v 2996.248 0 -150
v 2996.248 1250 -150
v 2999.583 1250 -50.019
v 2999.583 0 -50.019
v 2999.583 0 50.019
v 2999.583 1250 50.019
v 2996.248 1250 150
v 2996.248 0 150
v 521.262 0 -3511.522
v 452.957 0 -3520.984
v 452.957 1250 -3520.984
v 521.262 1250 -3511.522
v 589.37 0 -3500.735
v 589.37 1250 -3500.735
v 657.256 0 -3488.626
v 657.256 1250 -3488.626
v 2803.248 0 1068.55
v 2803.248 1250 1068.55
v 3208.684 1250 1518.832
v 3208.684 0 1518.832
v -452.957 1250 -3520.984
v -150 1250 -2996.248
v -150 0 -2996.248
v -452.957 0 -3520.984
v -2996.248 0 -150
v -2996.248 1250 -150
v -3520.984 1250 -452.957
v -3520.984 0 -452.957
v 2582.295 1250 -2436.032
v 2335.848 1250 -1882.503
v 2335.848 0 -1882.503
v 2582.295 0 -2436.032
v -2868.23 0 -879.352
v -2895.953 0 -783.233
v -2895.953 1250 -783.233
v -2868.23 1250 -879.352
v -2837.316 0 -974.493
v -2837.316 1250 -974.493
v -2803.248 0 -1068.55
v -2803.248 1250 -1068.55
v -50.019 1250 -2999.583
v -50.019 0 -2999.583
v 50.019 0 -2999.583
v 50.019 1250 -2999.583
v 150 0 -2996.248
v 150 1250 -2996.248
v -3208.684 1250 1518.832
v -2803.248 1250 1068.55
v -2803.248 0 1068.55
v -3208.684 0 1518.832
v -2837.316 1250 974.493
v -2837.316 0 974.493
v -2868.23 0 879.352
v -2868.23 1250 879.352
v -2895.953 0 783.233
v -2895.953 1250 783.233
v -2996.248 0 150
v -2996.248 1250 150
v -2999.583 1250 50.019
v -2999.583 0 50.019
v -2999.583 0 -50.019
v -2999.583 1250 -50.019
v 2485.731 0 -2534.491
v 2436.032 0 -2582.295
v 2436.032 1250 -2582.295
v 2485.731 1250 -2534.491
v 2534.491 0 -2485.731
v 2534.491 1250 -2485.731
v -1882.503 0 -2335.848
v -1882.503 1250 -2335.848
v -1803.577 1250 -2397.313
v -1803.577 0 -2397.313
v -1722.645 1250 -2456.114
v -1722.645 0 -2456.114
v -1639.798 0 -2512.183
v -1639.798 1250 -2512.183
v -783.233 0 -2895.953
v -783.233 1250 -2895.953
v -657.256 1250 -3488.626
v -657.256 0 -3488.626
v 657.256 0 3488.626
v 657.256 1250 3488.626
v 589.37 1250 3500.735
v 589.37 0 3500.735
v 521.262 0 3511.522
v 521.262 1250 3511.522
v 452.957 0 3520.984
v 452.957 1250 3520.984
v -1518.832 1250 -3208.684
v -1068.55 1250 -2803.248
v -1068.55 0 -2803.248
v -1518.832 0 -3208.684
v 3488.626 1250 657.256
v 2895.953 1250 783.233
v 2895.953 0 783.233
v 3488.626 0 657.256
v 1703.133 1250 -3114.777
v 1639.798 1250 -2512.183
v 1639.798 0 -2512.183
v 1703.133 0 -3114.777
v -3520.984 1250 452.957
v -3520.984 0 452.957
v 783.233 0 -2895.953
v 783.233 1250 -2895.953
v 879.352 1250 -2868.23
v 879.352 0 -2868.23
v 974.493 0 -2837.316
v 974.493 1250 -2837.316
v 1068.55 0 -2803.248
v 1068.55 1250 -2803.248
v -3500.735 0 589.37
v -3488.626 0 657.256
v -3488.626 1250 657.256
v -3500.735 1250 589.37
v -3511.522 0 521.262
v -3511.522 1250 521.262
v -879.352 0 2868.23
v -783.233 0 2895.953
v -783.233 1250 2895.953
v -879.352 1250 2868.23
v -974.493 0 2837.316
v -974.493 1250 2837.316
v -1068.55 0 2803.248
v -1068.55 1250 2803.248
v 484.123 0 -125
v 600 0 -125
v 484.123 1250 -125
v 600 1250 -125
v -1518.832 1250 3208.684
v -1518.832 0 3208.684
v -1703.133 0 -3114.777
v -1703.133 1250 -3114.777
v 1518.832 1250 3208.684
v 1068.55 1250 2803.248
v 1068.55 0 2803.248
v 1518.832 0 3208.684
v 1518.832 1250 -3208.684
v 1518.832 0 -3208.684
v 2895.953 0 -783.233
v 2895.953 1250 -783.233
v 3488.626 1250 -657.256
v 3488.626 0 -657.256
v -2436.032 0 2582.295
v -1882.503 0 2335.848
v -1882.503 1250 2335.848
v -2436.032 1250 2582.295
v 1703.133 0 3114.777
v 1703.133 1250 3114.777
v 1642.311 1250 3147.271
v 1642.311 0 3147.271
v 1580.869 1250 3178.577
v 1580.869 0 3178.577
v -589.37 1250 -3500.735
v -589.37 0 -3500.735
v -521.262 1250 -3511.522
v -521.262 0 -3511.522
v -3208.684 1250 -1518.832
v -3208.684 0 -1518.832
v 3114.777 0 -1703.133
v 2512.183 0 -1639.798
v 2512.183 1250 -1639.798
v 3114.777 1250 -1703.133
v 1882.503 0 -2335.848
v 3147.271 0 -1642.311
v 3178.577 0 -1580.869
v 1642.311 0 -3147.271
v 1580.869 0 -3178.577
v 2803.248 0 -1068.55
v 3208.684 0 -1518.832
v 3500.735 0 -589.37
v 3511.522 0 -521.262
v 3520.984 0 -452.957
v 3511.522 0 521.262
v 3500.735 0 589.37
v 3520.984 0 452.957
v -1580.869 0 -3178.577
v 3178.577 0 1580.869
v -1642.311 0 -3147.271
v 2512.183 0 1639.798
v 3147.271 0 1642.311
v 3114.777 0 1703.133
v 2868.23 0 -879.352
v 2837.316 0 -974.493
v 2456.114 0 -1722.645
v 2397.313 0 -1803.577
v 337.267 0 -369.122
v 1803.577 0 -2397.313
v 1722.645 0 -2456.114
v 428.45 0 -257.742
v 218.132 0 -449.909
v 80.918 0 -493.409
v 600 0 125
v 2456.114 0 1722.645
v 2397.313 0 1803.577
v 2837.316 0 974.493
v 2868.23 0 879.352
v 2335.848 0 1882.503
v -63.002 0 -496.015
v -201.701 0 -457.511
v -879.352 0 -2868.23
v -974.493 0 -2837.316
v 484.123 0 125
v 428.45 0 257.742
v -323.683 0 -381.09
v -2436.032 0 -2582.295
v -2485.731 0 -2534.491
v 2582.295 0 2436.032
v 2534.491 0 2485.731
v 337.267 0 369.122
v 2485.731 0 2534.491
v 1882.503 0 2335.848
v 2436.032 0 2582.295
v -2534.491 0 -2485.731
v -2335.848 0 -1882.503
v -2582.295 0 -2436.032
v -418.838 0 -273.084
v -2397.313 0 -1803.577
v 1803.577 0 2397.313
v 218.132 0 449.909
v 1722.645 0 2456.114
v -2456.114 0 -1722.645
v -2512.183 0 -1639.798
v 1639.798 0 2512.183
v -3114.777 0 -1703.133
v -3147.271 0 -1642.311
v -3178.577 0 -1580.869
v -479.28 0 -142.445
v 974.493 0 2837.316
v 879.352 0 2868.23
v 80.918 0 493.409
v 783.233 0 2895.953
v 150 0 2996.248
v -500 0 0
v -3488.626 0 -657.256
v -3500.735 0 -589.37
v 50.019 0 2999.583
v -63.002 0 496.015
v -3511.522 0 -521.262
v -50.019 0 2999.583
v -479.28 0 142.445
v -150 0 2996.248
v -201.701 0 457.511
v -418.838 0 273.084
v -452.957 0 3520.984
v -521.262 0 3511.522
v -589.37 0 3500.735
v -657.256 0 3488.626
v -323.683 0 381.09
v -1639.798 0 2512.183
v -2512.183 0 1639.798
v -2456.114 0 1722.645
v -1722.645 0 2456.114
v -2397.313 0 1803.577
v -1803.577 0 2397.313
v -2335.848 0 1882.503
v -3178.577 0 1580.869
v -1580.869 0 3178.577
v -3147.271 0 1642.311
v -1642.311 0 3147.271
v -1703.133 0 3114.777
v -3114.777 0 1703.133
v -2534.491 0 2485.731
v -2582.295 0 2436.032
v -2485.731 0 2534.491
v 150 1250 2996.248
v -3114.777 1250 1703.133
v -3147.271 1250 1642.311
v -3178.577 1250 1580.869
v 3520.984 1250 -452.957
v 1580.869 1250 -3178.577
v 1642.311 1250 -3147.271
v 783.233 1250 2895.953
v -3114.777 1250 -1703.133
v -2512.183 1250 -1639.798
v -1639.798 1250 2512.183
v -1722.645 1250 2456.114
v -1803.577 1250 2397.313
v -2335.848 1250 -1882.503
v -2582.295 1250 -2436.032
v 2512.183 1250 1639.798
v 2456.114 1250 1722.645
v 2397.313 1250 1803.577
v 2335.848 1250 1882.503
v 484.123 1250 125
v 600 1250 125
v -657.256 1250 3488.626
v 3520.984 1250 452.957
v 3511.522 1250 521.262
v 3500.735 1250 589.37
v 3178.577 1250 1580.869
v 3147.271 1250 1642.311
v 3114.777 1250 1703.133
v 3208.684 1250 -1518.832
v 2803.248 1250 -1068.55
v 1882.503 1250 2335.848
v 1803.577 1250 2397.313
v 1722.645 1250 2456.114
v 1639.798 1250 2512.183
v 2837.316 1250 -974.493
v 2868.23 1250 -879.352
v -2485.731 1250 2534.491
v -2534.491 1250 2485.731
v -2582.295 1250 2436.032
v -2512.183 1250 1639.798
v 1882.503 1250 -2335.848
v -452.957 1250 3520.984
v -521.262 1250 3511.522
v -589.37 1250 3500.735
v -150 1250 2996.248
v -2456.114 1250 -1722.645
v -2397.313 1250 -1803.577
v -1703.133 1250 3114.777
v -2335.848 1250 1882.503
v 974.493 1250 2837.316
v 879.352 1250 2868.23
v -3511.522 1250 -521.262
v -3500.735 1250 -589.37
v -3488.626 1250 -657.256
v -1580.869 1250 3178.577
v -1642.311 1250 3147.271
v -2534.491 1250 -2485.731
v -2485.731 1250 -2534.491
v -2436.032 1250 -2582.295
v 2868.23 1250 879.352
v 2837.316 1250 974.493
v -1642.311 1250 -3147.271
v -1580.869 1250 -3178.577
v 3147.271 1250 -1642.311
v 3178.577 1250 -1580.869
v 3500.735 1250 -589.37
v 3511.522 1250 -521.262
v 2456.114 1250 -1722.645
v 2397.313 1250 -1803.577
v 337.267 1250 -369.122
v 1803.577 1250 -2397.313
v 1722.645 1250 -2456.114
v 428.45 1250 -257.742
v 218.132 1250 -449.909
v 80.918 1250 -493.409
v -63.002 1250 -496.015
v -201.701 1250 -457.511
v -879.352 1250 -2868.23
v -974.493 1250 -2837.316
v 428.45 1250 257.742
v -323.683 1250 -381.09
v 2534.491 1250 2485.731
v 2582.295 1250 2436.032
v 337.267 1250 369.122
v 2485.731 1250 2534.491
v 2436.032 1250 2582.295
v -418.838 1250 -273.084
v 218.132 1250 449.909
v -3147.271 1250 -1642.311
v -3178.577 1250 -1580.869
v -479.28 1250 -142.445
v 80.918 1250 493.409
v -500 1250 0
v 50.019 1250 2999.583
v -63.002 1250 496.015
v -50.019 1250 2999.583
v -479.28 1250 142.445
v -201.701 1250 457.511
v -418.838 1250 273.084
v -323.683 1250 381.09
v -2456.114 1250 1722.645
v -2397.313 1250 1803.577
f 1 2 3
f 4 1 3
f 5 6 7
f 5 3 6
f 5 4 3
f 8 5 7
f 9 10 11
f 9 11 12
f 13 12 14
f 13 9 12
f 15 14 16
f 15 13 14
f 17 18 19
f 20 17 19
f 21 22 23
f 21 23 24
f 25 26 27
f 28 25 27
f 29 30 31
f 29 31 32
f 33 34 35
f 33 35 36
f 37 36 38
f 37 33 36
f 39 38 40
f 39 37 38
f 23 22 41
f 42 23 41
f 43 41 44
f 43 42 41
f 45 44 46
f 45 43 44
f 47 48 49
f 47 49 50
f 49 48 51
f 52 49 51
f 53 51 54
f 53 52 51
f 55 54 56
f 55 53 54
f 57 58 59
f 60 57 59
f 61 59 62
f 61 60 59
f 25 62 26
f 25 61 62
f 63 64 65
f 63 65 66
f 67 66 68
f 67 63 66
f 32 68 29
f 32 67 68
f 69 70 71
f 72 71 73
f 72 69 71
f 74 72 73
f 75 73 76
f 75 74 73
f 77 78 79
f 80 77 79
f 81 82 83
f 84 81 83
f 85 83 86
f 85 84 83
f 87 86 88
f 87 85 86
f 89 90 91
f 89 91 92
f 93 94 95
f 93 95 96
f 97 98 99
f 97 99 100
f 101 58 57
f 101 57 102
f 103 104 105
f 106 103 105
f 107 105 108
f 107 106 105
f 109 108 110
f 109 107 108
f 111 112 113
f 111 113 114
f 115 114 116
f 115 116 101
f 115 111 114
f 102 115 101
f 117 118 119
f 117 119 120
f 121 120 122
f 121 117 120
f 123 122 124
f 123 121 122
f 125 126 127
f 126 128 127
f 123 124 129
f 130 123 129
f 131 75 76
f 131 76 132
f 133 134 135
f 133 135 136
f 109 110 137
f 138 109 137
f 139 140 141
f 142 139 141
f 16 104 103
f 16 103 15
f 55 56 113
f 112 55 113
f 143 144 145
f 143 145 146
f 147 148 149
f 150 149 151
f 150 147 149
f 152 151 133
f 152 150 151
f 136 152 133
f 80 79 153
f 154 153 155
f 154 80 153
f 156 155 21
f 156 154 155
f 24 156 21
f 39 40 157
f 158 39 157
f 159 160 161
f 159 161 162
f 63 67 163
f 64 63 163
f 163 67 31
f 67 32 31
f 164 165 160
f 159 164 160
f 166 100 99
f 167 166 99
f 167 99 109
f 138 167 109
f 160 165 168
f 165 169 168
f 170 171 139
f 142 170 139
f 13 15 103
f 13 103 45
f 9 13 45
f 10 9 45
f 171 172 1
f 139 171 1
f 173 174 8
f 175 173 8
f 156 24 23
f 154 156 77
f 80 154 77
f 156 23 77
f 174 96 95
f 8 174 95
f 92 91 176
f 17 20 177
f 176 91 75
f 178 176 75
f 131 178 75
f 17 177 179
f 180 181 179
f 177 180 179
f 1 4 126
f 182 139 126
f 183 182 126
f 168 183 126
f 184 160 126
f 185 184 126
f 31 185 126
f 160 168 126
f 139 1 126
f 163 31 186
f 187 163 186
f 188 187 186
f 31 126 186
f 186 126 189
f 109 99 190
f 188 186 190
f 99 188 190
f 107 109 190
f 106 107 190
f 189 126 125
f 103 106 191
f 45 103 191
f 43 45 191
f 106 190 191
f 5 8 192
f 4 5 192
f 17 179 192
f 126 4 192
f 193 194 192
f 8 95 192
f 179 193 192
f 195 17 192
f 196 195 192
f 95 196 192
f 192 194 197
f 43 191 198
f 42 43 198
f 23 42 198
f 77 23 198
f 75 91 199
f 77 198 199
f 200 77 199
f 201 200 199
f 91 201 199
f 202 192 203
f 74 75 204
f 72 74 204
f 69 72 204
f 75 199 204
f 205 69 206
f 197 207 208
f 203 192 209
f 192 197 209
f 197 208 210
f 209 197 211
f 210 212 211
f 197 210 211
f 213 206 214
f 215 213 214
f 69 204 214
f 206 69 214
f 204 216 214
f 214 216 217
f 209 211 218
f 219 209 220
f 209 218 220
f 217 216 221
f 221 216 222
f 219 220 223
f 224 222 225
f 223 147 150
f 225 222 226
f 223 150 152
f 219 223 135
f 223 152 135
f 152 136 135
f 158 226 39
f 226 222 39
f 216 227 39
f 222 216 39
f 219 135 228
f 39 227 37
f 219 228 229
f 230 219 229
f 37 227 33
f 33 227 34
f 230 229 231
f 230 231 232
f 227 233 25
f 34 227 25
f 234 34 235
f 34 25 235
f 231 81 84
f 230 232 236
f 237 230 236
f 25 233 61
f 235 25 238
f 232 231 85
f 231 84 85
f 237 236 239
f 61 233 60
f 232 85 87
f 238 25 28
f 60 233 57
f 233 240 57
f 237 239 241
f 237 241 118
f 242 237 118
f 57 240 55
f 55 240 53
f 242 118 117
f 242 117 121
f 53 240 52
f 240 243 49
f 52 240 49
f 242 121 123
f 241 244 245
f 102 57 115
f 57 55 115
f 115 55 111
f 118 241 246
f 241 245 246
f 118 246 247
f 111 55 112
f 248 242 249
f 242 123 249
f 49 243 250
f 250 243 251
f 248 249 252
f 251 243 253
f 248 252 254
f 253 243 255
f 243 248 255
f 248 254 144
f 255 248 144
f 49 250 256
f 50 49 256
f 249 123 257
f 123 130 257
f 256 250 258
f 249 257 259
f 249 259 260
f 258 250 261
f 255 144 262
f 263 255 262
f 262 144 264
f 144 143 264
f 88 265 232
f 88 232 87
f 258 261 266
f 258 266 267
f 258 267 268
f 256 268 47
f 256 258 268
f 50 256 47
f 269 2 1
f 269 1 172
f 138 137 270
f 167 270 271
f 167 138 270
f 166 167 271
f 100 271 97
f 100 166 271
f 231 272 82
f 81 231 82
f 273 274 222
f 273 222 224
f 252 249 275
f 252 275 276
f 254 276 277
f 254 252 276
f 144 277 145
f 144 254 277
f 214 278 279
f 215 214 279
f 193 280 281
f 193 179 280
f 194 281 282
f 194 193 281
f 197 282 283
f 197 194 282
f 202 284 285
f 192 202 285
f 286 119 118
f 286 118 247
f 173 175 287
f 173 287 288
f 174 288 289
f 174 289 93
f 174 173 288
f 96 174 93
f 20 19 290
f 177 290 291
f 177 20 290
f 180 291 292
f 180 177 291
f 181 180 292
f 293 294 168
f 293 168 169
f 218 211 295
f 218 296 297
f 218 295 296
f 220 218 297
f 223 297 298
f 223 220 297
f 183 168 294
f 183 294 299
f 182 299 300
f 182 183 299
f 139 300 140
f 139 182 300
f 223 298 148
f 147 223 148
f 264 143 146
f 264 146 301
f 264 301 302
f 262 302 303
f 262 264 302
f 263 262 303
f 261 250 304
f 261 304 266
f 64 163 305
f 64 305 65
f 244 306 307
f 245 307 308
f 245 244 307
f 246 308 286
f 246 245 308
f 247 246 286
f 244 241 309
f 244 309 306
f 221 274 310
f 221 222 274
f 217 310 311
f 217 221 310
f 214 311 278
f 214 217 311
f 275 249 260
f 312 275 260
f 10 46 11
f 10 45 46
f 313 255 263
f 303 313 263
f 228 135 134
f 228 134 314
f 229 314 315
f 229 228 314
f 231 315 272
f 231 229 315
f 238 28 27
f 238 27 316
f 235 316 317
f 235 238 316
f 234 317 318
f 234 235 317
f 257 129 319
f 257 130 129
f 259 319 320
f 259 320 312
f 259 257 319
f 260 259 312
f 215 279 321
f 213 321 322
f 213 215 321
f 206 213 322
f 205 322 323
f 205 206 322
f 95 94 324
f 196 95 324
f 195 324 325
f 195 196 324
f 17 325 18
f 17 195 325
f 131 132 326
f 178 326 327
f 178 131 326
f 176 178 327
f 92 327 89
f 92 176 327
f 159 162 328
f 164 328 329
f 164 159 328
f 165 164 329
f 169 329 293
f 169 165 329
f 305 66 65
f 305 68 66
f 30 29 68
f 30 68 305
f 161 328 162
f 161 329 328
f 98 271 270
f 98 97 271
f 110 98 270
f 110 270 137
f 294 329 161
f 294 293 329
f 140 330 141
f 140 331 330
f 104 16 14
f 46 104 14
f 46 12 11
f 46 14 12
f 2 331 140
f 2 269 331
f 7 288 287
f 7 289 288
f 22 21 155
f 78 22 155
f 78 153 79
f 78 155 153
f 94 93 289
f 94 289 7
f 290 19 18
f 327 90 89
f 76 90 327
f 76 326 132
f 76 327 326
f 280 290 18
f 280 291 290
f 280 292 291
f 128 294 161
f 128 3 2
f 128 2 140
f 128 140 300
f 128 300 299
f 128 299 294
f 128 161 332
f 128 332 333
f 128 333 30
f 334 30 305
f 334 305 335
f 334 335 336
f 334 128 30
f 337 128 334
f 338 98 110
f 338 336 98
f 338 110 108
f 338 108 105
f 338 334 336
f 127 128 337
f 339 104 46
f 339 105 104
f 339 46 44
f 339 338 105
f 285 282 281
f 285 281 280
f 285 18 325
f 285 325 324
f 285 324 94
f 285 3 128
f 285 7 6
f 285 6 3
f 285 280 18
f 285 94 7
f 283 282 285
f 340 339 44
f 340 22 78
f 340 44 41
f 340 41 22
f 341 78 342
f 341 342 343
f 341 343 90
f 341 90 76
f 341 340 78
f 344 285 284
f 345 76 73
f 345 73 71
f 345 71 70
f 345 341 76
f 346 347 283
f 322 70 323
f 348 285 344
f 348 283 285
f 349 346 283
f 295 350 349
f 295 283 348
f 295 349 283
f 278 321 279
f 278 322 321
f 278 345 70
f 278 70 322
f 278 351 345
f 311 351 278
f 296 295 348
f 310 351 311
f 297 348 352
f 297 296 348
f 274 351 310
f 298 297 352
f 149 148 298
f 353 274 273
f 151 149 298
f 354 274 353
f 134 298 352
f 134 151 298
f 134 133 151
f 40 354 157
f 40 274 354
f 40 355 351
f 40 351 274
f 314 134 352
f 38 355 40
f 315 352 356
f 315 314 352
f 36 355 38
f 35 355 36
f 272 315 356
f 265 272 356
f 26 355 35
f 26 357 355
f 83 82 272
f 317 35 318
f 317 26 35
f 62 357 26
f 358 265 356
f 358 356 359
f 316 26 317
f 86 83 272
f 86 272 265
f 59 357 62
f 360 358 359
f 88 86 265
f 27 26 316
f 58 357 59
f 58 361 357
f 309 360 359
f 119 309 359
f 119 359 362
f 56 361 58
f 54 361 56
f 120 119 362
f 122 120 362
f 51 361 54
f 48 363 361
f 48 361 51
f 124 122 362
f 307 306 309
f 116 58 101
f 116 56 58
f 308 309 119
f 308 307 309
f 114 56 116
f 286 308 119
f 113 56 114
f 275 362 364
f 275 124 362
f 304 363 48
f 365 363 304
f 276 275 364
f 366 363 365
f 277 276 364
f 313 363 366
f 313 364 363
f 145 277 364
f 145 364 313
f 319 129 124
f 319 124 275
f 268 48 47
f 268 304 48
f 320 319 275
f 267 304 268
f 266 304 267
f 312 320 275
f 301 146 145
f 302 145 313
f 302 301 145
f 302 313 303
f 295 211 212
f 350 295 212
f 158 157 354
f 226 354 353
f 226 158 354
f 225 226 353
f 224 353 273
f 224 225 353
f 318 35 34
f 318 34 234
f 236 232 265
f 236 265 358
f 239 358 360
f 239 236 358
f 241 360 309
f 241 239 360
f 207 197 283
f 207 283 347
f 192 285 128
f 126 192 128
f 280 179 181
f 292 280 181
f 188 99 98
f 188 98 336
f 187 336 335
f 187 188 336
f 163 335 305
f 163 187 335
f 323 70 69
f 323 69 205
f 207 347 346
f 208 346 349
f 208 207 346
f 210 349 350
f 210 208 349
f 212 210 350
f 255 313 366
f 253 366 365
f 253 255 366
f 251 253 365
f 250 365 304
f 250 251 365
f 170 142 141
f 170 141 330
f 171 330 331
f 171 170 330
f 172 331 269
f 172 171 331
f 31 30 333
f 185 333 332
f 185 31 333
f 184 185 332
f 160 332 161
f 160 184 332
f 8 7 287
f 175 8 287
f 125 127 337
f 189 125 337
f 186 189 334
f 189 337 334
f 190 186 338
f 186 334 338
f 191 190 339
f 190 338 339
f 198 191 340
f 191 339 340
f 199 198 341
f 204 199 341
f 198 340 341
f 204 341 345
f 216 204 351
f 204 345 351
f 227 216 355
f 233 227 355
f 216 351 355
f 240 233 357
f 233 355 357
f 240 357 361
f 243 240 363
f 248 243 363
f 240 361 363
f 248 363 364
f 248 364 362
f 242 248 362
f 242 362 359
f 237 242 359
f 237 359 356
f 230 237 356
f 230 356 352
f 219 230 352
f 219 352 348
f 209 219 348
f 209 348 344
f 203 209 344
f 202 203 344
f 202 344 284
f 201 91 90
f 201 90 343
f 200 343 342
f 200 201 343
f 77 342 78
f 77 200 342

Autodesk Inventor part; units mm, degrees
ref_plane "YZ Plane" through (0, 0, 0) normal (1, 0, 0) x (0, 1, 0)
ref_plane "XZ Plane" through (0, 0, 0) normal (0, 1, 0) x (-1, 0, 0)
ref_plane "XY Plane" through (0, 0, 0) normal (0, 0, 1) x (1, 0, 0)
sketch "Sketch1" plane through (0, 0, 0) normal (0, 1, 0) x (-1, 0, 0)
  circle A0 centre (0, 0) radius 3550
  line L0 (0, 0) -> (0, -150)
  line L1 (0, 150) -> (0, -150)
  line L2 (4243.0122, 0) -> (4511.7157, 0) construction
  line L3 (0, 0) -> (0, 150)
  arc A1 (2996.2477, -150) -> (2996.2477, 150) centre (0, 0) ccw
  line L4 (2996.2477, -150) -> (3520.9843, -452.9568)
  line L5 (2996.2477, 150) -> (3520.9843, 452.9568)
  point P0 (3536.4628, -309.7269)
  point P1 (3536.4628, 309.7269)
  dimension "d1" = 150
  dimension "d20" = 150
ref_plane "Work Plane1" through (0, 625, 0) normal (0, 1, 0) x (1, 0, 0)
extrude "Extrusion4" add sketch "Sketch1" along normal blind 1250
extrude "Extrusion5" cut sketch "Sketch1" along normal blind 1250 contours A0 L4 A1 L5 picked at (3349.0246, 326.912)
pattern_circular "Circular Pattern2" count 20 over 360 about axis through (0, -10, 0) along (0, 1, 0) of "Extrusion5"
sketch "Sketch3" plane through (0, 1250, 0) normal (0, 1, 0) x (1, 0, 0)
  arc A0 (484.1229, 125) -> (484.1229, -125) centre (0, 0) ccw
  line L0 (484.1229, -125) -> (600, -125)
  line L1 (600, -125) -> (600, 125)
  line L2 (600, 125) -> (484.1229, 125)
extrude "Extrusion7" cut sketch "Sketch3" against normal blind 1250
